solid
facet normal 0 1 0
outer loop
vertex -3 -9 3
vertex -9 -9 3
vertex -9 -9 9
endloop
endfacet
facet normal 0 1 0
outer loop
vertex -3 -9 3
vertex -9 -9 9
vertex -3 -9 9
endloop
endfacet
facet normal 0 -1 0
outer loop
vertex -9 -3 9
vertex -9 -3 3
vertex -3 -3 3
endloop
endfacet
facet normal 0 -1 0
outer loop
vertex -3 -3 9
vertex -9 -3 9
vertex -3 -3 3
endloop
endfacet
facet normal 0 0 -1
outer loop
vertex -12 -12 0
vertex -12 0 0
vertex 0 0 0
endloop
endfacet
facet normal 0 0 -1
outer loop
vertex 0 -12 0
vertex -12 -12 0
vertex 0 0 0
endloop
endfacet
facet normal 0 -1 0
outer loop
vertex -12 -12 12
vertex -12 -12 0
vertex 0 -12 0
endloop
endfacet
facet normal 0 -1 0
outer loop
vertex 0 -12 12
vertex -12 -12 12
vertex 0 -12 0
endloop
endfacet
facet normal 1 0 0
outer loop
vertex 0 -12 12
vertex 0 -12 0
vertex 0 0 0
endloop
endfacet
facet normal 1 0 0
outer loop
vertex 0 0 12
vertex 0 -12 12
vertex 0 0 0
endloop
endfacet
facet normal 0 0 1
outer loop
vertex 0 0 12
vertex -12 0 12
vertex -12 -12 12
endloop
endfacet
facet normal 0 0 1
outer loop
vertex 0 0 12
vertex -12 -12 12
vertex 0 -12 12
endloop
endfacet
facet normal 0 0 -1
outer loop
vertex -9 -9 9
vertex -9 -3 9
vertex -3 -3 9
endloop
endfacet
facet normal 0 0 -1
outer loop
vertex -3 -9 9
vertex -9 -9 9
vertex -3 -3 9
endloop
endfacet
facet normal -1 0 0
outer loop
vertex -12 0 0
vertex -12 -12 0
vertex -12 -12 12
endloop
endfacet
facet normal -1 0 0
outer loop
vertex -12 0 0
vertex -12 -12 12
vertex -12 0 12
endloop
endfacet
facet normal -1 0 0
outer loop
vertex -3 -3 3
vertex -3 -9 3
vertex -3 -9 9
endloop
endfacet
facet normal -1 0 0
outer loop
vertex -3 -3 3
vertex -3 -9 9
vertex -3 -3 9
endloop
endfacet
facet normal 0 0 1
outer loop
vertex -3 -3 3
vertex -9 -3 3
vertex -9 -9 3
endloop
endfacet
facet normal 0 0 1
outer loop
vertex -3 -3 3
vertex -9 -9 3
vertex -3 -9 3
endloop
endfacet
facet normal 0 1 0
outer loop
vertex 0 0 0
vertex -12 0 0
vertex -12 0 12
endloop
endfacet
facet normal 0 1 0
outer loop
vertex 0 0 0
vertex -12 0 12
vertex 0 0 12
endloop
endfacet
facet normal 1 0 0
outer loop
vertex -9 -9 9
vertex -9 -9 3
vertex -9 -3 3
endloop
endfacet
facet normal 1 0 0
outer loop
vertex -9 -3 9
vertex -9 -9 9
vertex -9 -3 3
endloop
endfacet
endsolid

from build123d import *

# Parameters (mm, degrees)
F0_W     = 12
F0_H     = 12
F1_DEPTH = 12
F3_START = 3
F2_W     = 6
F2_H     = 6
F3_DEPTH = 6


with BuildPart() as f1:
    # F0 (on Top) → F1 (new body)
    with BuildSketch(Plane.XY):
        with Locations((-6, -6)):
            Rectangle(F0_W, F0_H)
    extrude(amount=F1_DEPTH)

    # F2 (on Top) → F3 (cut)
    with BuildSketch(Plane.XY.offset(F3_START)):
        with Locations((-6, -6)):
            Rectangle(F2_W, F2_H)
    extrude(amount=F3_DEPTH, mode=Mode.SUBTRACT)


solid = f1.part
